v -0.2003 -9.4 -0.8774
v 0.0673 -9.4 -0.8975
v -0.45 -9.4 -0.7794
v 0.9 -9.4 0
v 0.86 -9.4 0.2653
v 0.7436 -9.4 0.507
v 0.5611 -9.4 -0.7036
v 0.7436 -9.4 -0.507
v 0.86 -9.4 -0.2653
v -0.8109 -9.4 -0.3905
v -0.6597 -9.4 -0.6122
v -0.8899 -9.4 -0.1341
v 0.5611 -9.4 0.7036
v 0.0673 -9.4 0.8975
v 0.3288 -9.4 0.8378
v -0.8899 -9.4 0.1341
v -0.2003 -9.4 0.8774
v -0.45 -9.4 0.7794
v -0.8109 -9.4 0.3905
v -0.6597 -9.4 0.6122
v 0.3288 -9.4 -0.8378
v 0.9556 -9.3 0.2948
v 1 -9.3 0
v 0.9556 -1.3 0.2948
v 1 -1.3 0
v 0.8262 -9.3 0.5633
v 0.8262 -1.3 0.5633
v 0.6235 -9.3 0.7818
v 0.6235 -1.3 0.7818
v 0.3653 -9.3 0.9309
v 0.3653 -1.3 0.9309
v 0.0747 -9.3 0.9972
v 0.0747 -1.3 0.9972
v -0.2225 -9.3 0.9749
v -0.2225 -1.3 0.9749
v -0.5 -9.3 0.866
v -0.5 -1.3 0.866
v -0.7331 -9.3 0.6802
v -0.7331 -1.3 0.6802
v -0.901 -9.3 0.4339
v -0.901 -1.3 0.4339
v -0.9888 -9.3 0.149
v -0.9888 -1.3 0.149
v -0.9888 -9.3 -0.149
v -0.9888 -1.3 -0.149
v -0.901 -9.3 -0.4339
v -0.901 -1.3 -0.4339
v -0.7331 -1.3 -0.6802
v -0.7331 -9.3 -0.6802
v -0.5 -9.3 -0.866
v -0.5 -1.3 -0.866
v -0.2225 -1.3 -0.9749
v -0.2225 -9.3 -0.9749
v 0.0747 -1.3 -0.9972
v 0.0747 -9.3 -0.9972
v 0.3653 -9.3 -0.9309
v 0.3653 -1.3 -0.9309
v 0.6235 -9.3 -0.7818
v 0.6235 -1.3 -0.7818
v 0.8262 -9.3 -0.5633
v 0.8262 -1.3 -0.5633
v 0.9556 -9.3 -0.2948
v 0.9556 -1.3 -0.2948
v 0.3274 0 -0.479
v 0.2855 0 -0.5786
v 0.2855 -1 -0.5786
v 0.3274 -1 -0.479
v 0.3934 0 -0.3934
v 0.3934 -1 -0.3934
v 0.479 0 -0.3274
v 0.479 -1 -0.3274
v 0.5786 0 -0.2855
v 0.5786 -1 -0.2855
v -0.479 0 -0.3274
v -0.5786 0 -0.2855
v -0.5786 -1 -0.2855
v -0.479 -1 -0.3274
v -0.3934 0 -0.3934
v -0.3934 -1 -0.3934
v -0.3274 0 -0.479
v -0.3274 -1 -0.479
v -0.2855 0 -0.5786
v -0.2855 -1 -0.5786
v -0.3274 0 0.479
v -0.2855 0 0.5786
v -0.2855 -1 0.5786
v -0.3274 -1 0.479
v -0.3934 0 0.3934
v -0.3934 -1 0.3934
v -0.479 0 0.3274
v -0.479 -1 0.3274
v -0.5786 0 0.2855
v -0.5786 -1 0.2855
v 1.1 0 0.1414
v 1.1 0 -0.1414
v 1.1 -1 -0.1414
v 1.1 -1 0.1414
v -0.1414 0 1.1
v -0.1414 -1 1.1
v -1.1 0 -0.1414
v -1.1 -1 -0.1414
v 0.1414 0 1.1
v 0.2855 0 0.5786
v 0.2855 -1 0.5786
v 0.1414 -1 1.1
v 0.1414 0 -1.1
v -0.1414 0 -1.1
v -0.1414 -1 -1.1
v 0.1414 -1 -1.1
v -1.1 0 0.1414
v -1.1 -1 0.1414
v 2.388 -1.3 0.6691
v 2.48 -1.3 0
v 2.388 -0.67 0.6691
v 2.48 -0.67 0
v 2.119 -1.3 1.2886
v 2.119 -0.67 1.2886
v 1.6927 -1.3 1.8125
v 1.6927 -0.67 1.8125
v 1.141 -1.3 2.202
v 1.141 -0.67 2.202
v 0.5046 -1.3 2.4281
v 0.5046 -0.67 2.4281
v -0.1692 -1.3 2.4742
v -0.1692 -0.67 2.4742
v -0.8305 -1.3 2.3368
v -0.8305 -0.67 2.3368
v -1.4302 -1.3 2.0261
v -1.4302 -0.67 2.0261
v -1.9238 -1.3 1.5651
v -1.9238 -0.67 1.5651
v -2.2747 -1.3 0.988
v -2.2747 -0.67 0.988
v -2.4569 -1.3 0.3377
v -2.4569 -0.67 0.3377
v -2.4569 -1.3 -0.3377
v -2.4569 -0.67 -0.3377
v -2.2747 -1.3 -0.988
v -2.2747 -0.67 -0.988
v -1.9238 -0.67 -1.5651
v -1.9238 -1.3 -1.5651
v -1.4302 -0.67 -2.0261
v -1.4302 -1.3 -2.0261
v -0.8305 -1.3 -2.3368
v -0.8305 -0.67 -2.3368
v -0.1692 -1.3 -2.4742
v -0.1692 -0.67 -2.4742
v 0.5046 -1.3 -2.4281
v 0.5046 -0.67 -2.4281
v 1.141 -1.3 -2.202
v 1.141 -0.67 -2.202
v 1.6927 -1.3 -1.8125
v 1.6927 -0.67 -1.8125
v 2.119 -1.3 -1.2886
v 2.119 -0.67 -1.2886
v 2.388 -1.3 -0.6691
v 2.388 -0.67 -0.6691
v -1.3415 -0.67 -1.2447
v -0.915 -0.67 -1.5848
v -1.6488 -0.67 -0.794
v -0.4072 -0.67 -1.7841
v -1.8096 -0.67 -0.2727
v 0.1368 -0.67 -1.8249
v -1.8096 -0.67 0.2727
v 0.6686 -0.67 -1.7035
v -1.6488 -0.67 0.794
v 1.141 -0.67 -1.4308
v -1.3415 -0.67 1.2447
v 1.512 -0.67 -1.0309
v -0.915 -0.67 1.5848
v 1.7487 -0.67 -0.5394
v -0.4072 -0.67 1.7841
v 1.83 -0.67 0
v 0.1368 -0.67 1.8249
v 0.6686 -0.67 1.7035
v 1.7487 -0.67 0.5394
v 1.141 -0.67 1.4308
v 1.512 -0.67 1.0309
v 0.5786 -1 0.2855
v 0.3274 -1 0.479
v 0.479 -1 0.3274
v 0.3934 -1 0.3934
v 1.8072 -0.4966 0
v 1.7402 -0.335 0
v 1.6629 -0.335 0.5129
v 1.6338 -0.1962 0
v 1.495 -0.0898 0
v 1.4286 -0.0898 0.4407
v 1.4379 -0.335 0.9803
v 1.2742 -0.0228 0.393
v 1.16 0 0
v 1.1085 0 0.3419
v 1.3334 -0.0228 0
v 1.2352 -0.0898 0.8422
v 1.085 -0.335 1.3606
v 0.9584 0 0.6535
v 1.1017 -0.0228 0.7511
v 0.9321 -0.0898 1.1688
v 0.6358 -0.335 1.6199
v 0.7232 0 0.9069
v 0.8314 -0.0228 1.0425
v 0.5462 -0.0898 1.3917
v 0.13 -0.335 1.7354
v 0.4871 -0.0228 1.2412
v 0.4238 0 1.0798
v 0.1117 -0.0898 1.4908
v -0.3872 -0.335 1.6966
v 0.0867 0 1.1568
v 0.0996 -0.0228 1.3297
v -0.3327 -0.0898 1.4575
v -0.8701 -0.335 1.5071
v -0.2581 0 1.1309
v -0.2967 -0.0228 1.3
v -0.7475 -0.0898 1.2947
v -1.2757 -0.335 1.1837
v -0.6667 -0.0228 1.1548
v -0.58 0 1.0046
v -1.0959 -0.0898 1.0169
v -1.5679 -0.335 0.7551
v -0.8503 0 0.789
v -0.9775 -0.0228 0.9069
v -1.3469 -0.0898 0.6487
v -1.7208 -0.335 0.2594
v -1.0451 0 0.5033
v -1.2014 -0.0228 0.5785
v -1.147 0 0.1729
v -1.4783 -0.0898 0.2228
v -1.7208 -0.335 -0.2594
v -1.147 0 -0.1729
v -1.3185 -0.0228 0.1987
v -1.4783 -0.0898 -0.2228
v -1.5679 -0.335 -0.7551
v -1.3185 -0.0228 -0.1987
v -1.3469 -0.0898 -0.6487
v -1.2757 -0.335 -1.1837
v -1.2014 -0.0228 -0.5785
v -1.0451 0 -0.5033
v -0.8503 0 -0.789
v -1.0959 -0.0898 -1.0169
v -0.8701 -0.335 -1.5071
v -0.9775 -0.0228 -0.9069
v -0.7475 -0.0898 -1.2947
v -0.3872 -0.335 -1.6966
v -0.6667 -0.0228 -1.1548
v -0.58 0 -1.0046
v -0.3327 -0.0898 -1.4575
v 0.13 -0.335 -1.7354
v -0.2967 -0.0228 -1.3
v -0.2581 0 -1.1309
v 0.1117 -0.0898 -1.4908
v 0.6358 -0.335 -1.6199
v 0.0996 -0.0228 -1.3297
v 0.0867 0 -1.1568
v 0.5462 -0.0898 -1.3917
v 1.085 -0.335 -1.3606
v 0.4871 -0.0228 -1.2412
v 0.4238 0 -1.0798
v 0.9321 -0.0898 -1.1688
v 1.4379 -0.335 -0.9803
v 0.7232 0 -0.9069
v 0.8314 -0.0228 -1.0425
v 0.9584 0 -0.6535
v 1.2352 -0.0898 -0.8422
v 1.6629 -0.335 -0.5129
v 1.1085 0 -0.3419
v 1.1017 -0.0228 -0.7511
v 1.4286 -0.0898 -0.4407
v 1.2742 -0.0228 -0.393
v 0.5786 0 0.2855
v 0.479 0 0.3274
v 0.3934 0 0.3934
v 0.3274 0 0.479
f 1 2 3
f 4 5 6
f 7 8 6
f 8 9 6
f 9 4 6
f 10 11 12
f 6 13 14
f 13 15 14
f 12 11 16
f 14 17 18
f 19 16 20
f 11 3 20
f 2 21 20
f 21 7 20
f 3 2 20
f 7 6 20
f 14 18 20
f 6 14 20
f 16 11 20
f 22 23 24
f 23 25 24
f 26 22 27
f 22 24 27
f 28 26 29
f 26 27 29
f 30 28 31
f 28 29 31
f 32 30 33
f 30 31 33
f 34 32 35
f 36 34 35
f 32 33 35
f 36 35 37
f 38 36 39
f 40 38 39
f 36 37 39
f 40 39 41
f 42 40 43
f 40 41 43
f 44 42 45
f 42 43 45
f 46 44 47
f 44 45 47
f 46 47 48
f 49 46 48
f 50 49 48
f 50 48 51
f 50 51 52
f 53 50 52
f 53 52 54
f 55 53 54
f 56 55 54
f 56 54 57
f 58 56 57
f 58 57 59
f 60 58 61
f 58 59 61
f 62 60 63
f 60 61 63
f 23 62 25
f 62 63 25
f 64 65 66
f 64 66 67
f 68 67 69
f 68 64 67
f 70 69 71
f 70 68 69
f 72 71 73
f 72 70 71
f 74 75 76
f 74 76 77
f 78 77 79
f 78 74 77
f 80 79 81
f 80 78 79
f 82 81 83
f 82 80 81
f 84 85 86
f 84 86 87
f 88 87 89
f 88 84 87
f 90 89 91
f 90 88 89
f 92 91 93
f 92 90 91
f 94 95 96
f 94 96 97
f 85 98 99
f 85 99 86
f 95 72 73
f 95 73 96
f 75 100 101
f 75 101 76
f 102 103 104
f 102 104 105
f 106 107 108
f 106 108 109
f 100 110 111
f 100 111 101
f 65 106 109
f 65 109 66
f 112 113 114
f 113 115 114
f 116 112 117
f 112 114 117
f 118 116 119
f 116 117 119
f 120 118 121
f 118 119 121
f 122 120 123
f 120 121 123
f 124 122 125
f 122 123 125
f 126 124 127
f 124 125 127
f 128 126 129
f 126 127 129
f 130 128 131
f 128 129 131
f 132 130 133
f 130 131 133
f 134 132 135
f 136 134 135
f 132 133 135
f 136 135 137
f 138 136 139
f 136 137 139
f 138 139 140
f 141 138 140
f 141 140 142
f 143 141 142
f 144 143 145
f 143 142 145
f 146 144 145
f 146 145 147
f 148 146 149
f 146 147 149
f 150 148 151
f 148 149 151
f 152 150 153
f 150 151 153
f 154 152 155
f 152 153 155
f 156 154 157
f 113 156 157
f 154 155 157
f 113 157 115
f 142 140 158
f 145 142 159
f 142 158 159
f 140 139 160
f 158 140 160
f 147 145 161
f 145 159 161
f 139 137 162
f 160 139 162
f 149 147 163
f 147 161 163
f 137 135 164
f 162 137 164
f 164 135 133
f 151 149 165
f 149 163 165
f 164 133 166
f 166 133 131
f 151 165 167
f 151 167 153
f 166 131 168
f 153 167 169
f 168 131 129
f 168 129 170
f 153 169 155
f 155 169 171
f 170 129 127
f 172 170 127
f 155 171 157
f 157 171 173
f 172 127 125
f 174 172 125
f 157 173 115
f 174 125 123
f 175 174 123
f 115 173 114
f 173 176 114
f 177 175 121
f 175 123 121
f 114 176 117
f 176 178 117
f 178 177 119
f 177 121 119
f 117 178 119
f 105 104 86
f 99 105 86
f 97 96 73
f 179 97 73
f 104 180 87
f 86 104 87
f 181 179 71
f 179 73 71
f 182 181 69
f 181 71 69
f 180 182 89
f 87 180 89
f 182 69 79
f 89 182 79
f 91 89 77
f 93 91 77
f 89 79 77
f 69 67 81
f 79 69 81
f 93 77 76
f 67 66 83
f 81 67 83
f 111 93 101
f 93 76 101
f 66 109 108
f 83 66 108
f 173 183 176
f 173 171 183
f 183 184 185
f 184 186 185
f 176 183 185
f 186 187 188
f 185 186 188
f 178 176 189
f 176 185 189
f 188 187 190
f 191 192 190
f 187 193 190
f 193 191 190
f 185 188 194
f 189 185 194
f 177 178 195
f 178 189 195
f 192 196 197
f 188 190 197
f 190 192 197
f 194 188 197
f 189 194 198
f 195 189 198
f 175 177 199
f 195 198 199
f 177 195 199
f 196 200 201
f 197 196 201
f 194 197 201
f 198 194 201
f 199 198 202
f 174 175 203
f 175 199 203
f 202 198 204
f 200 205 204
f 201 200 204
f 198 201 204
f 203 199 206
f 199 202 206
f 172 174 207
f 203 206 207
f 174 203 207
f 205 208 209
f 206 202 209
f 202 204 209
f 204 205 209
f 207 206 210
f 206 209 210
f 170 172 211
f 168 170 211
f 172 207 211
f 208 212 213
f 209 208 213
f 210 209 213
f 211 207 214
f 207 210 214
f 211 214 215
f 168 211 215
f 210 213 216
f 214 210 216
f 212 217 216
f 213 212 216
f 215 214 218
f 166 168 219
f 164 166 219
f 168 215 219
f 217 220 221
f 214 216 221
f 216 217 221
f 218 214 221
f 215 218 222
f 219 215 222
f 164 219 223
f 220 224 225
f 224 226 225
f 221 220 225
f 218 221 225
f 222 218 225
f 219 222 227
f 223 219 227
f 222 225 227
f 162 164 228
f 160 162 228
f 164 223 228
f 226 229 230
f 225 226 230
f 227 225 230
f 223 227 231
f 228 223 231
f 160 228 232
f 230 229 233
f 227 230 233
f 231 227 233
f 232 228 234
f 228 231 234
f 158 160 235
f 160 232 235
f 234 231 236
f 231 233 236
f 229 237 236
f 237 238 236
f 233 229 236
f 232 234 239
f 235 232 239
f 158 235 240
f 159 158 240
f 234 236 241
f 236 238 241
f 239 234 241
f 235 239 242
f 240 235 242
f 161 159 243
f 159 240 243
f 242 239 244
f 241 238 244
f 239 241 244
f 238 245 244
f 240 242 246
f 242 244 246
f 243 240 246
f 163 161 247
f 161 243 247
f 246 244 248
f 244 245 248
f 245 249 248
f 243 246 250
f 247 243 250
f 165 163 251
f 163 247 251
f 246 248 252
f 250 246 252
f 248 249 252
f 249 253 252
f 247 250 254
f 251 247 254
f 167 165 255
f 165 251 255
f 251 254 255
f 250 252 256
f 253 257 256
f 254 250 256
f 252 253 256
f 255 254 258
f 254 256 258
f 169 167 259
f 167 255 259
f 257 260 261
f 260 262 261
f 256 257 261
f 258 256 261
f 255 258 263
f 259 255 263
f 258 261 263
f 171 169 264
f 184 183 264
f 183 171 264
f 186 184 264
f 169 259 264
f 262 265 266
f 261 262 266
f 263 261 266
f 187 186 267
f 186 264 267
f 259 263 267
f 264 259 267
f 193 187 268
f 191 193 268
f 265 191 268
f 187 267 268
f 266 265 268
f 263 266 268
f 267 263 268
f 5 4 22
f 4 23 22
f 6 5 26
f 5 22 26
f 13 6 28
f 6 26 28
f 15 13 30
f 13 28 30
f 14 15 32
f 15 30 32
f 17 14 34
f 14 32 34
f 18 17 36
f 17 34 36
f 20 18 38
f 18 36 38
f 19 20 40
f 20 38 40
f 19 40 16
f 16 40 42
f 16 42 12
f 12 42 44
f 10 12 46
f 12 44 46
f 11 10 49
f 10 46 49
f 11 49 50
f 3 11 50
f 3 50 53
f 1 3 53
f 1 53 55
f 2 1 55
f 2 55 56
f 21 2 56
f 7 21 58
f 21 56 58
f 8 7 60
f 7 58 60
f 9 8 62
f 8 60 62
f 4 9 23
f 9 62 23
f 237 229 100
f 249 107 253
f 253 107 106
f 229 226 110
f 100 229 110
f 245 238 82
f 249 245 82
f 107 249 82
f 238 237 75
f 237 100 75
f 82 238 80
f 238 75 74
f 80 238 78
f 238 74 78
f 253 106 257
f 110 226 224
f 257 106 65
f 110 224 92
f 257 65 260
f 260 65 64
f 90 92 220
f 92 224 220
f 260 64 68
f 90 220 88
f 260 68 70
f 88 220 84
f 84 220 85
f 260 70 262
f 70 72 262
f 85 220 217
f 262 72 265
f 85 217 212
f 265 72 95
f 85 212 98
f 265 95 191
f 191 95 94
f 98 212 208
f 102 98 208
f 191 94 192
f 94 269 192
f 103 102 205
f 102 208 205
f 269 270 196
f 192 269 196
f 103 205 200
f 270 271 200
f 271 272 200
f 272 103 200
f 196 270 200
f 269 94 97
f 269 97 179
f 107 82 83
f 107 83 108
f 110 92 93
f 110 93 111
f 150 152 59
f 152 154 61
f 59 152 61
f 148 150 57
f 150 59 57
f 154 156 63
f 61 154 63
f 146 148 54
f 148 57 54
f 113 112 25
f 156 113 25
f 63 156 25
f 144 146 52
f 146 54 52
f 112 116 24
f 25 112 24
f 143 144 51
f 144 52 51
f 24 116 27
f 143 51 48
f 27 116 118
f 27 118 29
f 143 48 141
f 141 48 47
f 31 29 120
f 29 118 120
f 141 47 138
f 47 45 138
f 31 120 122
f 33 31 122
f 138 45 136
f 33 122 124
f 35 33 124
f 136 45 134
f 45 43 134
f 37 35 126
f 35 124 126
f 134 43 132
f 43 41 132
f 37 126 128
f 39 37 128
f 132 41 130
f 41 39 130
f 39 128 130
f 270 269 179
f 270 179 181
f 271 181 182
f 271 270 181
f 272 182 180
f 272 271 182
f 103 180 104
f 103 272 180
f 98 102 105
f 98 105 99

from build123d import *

# Parameters (mm, degrees)
CUT_EXTRUDE1_DEPTH = 1


with BuildPart() as part:
    # Sketch1 → Revolve1 (revolve)
    with BuildSketch(Plane.XY):
        with BuildLine():
            Line((0, -9.4), (0.9, -9.4))
            Line((0.9, -9.4), (1, -9.3))
            Line((1, -9.3), (1, -1.3))
            Line((1, -1.3), (2.48, -1.3))
            Line((2.48, -1.3), (2.48, -0.67))
            Line((2.48, -0.67), (1.83, -0.67))
            ThreePointArc((1.83, -0.67), (1.633761543, -0.196238457), (1.16, 0))
            Line((1.16, 0), (0, 0))
            Line((0, 0), (0, -9.4))
        make_face()
    revolve(axis=Axis((0, 0, 0), (0, -1, 0)))

    # Sketch2 → Cut-Extrude1 (cut)
    with BuildSketch(Plane(origin=(0, 0, 0), x_dir=(1, 0, 0), z_dir=(0, 1, 0))):
        with BuildLine():
            Line((0, 1.1), (0.141406897, 1.1))
            Line((0.141406897, 1.1), (0.285471459, 0.578570854))
            ThreePointArc((0.285471459, 0.578570854), (0.393362387, 0.393362387), (0.578570854, 0.285471459))
            Line((0.578570854, 0.285471459), (1.1, 0.141406897))
            Line((1.1, 0.141406897), (1.1, 0))
            Line((1.1, 0), (1.1, -0.141406897))
            Line((1.1, -0.141406897), (0.578570854, -0.285471459))
            ThreePointArc((0.578570854, -0.285471459), (0.393362387, -0.393362387), (0.285471459, -0.578570854))
            Line((0.285471459, -0.578570854), (0.141406897, -1.1))
            Line((0.141406897, -1.1), (0, -1.1))
            Line((0, -1.1), (-0.141406897, -1.1))
            Line((-0.141406897, -1.1), (-0.285471459, -0.578570854))
            ThreePointArc((-0.285471459, -0.578570854), (-0.393362387, -0.393362387), (-0.578570854, -0.285471459))
            Line((-0.578570854, -0.285471459), (-1.1, -0.141406897))
            Line((-1.1, -0.141406897), (-1.1, 0))
            Line((-1.1, 0), (-1.1, 0.141406897))
            Line((-1.1, 0.141406897), (-0.578570854, 0.285471459))
            ThreePointArc((-0.578570854, 0.285471459), (-0.393362387, 0.393362387), (-0.285471459, 0.578570854))
            Line((-0.285471459, 0.578570854), (-0.141406897, 1.1))
            Line((-0.141406897, 1.1), (0, 1.1))
        make_face()
    extrude(amount=-CUT_EXTRUDE1_DEPTH, mode=Mode.SUBTRACT)


solid = part.part
